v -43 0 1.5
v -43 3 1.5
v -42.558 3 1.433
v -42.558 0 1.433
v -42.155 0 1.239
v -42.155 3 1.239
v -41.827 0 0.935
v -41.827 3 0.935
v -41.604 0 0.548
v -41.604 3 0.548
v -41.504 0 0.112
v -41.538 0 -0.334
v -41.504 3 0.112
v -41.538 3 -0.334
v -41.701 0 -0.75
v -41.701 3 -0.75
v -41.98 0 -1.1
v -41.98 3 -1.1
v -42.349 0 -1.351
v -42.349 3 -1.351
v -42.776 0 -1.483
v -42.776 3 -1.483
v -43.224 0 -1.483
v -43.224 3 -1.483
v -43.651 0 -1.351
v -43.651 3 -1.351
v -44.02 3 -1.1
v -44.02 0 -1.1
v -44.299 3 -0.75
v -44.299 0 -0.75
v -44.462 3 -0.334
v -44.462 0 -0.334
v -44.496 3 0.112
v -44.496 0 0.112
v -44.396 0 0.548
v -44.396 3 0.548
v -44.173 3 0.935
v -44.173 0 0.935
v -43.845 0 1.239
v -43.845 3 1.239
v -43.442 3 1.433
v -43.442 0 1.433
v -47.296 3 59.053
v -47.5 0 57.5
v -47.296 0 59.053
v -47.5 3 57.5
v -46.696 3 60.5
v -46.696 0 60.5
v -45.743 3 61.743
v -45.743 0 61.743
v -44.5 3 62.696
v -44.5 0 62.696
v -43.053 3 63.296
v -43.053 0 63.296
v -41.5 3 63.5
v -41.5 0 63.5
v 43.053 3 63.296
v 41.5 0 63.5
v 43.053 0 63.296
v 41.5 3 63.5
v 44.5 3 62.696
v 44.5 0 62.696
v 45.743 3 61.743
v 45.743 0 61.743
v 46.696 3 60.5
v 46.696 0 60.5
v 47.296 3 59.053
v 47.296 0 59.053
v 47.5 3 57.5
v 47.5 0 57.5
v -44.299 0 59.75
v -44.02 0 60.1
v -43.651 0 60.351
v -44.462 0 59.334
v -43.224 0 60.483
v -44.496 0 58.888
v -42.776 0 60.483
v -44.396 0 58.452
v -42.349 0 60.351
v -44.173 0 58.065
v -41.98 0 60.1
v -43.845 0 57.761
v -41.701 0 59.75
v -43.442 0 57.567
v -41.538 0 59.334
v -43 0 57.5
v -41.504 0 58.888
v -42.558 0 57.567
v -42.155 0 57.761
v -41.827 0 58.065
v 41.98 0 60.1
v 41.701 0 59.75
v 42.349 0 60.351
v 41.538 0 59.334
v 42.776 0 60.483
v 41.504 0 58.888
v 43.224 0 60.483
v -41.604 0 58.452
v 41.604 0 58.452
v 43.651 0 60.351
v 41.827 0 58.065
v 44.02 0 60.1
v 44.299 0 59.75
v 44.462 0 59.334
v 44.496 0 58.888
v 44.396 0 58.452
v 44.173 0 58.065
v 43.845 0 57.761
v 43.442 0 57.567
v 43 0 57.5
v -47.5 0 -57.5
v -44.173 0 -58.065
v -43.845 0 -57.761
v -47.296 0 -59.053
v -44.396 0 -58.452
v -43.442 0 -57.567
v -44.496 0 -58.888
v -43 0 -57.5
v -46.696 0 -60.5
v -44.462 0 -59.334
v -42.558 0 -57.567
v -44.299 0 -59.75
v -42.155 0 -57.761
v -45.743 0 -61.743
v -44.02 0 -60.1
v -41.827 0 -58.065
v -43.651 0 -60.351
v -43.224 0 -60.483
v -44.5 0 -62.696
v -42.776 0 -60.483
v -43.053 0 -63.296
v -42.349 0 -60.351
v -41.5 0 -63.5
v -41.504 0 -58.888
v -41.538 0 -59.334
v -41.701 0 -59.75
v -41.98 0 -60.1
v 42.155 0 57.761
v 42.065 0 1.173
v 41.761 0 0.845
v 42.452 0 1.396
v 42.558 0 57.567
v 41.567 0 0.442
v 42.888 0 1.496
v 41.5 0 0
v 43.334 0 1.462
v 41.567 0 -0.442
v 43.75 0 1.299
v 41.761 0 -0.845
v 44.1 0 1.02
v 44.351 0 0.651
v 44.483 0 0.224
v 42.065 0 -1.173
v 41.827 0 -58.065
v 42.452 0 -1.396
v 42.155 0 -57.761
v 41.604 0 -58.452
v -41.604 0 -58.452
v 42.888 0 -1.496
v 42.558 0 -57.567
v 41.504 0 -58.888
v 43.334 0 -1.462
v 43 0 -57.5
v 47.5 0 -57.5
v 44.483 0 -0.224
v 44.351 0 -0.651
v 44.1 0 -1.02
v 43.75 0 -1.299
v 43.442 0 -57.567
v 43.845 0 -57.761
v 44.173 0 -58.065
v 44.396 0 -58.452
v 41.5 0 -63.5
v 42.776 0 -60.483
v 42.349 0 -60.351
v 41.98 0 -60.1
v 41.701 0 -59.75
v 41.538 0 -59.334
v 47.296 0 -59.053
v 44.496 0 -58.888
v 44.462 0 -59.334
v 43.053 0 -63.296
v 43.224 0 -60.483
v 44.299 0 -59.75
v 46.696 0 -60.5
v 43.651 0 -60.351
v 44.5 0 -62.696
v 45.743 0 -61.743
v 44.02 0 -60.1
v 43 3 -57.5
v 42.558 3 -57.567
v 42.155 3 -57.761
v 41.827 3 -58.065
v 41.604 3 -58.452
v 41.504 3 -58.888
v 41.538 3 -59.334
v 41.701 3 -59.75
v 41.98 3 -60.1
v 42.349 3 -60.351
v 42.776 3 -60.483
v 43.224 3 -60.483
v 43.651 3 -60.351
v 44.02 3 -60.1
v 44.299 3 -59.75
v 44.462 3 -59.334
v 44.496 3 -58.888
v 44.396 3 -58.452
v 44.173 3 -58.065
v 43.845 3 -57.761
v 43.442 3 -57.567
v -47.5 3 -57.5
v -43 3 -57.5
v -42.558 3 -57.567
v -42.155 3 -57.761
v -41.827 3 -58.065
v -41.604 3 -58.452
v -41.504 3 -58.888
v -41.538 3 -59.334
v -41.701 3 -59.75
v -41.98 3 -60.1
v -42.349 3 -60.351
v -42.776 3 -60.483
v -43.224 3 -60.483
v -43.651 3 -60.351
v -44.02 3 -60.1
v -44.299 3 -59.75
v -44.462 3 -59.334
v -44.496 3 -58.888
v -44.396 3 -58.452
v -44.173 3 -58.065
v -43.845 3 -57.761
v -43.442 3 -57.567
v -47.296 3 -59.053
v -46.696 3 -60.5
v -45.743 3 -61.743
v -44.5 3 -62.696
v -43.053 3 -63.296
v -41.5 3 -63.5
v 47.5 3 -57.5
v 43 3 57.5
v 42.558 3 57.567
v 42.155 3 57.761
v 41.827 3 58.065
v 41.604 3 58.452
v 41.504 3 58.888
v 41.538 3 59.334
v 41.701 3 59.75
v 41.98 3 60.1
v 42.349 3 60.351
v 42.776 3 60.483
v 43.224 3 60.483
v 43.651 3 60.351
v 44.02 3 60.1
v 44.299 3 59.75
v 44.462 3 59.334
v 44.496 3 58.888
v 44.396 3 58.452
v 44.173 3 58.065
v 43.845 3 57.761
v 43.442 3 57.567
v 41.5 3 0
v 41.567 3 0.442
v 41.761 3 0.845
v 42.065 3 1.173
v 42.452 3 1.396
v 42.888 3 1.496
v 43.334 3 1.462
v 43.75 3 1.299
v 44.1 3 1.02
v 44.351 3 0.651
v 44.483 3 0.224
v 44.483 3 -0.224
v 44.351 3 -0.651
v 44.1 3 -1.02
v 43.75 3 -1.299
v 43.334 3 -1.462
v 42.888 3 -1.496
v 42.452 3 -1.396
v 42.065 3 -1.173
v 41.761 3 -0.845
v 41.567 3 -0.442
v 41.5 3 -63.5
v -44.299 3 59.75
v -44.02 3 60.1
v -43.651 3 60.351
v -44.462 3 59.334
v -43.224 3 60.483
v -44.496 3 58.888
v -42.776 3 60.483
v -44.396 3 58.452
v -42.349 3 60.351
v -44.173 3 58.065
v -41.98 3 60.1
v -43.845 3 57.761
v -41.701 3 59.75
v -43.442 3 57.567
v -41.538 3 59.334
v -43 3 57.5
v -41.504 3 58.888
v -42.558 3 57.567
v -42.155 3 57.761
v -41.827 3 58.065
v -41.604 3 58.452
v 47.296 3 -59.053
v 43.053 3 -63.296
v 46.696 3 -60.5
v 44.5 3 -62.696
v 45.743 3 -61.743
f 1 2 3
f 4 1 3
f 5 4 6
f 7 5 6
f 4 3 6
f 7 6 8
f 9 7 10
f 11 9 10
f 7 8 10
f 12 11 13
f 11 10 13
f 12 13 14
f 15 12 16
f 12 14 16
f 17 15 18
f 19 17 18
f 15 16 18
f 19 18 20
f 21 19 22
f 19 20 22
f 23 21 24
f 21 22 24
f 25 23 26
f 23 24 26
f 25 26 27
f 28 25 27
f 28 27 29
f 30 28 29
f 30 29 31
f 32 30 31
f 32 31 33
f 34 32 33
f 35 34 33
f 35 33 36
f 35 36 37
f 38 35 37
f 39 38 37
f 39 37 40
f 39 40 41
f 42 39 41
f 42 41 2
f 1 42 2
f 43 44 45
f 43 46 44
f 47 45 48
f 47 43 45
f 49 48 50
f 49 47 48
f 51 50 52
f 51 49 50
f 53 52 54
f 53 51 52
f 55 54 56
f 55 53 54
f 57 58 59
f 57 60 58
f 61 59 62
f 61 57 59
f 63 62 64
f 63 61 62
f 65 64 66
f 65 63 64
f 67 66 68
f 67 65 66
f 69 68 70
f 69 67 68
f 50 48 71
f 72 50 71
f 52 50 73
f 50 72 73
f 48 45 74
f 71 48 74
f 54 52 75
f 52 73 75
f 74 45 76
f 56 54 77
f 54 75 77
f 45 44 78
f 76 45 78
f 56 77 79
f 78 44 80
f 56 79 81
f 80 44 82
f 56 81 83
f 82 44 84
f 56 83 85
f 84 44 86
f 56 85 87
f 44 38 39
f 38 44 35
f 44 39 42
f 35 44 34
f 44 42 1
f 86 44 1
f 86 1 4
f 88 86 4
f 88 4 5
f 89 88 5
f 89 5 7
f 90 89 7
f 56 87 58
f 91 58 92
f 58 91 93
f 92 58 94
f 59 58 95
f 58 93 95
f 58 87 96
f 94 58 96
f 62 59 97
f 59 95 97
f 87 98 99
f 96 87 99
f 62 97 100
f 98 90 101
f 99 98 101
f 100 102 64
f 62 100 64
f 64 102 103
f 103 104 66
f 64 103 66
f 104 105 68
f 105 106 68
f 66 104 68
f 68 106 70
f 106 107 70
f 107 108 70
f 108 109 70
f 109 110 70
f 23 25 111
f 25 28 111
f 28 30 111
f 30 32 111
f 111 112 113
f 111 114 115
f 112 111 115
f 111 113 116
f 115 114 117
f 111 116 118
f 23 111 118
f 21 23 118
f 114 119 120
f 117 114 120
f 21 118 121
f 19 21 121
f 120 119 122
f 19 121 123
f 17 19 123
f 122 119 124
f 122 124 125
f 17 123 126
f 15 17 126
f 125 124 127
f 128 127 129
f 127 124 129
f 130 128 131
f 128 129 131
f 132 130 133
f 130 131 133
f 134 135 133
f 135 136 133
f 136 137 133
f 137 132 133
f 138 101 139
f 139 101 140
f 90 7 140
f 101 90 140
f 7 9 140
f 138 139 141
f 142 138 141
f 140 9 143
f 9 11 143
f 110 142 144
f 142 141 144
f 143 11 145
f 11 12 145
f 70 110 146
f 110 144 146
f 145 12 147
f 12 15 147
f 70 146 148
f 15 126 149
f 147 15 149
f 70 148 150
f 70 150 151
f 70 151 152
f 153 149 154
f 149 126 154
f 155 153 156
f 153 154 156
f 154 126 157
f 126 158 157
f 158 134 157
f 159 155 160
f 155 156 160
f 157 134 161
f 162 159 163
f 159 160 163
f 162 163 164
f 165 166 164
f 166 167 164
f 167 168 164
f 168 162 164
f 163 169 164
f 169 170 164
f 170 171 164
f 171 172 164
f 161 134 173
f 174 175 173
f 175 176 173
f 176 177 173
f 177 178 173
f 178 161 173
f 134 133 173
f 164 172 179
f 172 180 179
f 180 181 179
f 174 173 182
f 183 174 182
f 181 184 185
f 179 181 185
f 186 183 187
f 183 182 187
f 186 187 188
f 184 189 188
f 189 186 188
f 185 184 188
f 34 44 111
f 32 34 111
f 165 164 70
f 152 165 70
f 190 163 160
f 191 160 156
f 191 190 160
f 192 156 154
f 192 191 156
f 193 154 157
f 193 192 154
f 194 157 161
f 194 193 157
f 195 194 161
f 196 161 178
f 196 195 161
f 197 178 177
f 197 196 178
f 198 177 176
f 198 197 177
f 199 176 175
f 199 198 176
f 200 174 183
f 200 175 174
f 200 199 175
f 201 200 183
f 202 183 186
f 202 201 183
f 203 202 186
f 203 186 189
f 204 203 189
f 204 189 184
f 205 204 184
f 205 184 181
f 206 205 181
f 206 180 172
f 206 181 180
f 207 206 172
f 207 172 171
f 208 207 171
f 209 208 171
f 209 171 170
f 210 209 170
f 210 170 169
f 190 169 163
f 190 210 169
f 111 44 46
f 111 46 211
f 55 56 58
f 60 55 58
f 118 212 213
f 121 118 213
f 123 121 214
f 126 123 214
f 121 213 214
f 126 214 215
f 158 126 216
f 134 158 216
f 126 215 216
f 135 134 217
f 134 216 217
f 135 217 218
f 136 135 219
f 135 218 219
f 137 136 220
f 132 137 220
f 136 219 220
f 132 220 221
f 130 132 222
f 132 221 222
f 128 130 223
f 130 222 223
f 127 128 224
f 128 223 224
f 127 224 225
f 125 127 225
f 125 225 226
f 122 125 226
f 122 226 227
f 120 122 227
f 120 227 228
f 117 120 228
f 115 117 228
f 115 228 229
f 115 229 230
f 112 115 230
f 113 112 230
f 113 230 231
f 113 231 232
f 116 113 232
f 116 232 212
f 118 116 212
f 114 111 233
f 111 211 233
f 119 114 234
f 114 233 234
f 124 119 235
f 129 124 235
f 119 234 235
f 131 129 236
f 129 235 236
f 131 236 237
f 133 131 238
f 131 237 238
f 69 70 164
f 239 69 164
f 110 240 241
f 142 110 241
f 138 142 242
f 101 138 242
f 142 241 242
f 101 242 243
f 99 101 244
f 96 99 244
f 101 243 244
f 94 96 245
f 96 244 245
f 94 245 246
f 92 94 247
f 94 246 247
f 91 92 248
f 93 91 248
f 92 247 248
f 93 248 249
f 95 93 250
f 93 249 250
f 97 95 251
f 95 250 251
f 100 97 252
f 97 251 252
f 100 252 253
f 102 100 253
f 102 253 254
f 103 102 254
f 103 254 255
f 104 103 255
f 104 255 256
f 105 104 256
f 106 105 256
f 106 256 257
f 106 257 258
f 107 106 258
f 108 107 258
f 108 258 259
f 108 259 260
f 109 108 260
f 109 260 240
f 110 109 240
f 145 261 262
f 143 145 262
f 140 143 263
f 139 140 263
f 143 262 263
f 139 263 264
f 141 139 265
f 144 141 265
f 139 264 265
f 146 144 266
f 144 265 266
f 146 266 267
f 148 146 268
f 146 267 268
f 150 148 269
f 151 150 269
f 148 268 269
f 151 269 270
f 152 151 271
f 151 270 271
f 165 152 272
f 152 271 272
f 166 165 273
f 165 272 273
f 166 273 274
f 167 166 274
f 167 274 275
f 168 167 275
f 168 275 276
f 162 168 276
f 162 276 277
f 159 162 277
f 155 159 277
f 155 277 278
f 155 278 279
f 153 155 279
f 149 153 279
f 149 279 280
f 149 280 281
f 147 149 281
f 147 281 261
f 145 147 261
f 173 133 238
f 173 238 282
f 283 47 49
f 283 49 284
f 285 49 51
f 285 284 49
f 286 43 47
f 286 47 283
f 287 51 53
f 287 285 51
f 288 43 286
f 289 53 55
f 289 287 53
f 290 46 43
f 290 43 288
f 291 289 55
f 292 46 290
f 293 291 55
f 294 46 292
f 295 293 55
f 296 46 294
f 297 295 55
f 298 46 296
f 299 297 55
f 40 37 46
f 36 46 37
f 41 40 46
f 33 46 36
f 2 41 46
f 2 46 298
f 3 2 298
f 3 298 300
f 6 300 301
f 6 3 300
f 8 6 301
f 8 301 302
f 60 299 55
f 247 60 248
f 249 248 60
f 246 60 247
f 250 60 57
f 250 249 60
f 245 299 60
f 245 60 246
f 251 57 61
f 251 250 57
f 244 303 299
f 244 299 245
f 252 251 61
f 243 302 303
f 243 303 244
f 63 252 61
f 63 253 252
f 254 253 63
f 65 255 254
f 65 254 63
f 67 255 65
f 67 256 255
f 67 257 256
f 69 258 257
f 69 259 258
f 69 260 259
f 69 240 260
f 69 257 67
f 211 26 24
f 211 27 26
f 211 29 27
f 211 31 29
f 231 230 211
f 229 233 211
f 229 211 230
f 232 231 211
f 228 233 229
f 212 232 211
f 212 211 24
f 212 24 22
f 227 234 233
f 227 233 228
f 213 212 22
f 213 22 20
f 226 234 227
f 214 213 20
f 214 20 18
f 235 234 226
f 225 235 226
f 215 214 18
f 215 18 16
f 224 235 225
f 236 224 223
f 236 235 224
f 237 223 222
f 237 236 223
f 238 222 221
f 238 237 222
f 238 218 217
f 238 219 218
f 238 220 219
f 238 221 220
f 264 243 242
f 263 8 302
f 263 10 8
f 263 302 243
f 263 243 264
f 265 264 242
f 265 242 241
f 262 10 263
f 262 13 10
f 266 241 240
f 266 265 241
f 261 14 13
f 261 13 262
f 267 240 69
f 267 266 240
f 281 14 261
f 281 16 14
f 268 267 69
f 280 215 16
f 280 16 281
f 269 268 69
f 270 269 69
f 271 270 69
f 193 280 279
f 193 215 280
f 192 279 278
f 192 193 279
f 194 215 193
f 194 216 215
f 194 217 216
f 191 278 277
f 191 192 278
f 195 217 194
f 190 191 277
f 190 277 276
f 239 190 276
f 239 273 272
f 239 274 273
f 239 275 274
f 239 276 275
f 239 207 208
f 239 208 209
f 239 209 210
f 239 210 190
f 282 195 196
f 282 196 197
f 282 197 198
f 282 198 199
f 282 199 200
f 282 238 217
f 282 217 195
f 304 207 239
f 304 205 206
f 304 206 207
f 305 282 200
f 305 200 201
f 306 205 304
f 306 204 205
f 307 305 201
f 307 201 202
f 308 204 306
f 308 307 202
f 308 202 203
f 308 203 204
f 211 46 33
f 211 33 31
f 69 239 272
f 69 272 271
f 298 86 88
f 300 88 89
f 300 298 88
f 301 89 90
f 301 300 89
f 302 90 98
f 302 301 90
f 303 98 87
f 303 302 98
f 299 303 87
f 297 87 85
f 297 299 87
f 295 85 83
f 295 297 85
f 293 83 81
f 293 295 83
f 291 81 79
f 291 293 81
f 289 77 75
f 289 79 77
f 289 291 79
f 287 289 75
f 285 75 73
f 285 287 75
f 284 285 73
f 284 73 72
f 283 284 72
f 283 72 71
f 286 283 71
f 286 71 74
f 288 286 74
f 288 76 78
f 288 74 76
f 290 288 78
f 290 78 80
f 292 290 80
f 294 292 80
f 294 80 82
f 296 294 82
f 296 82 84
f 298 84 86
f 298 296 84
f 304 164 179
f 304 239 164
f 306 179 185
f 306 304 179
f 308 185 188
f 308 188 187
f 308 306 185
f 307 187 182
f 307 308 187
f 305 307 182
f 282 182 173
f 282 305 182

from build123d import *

# Parameters (mm, degrees)
SKETCH1_W               = 95
SKETCH1_H               = 127
BOSS_EXTRUDE1_DEPTH     = 3
FILLET1_R               = 6
SKETCH2_R               = 1.5
CUT_EXTRUDE1_DEPTH      = 80.35678925
LPATTERN2_COUNT         = 2
LPATTERN2_PITCH         = 59
MIRROR2_COPY_1_SKETCH_R = 1.5
MIRROR2_COPY_1_DEPTH    = 80.35678925
MIRROR2_COPY_2_SKETCH_R = 1.5
MIRROR2_COPY_2_DEPTH    = 80.35678925


with BuildPart() as part:
    # Sketch1 → Boss-Extrude1 (new body)
    with BuildSketch(Plane(origin=(0, 0, 0), x_dir=(1, 0, 0), z_dir=(0, 1, 0))):
        Rectangle(SKETCH1_W, SKETCH1_H)
    extrude(amount=BOSS_EXTRUDE1_DEPTH)

    # Fillet1
    fillet1_edges = [part.edges().sort_by_distance(p)[0] for p in [
        (47.5, 1.5, 63.5),
        (-47.5, 1.5, 63.5),
        (-47.5, 1.5, -63.5),
        (47.5, 1.5, -63.5),
    ]]
    fillet(fillet1_edges, radius=FILLET1_R)

    # Sketch2 → Cut-Extrude1 (cut, through all)
    with BuildSketch(Plane(origin=(0, 3, 0), x_dir=(1, 0, 0), z_dir=(0, 1, 0))):
        with Locations(Location((-43, 59, 0), (0, 0, 270))):
            Circle(SKETCH2_R)
    cut_extrude1 = extrude(amount=-CUT_EXTRUDE1_DEPTH, mode=Mode.SUBTRACT)

    # Mirror1: Cut-Extrude1 across plane
    add(cut_extrude1.mirror(Plane.XY), mode=Mode.SUBTRACT)

    # LPattern2: Cut-Extrude1 ×2
    with Locations(*[(0, 0, i * LPATTERN2_PITCH) for i in range(1, LPATTERN2_COUNT)]):
        add(cut_extrude1, mode=Mode.SUBTRACT)

    # Mirror2: Cut-Extrude1 across plane
    add(cut_extrude1.mirror(Plane(origin=(0, 0, 0), x_dir=(0, 0, 1), z_dir=(1, 0, 0))), mode=Mode.SUBTRACT)

    # Mirror2 copy 1 sketch → Mirror2 copy 1 (cut, through all)
    with BuildSketch(Plane(origin=(0, 3, 0), x_dir=(-1, 0, 0), z_dir=(0, 1, 0))):
        with Locations(Location((-43, 59, 0), (0, 0, 270))):
            Circle(MIRROR2_COPY_1_SKETCH_R)
    extrude(amount=-MIRROR2_COPY_1_DEPTH, mode=Mode.SUBTRACT)

    # Mirror2 copy 2 sketch → Mirror2 copy 2 (cut, through all)
    with BuildSketch(Plane(origin=(0, 3, 59), x_dir=(-1, 0, 0), z_dir=(0, 1, 0))):
        with Locations((-43, -59)):
            Circle(MIRROR2_COPY_2_SKETCH_R)
    extrude(amount=-MIRROR2_COPY_2_DEPTH, mode=Mode.SUBTRACT)


solid = part.part
